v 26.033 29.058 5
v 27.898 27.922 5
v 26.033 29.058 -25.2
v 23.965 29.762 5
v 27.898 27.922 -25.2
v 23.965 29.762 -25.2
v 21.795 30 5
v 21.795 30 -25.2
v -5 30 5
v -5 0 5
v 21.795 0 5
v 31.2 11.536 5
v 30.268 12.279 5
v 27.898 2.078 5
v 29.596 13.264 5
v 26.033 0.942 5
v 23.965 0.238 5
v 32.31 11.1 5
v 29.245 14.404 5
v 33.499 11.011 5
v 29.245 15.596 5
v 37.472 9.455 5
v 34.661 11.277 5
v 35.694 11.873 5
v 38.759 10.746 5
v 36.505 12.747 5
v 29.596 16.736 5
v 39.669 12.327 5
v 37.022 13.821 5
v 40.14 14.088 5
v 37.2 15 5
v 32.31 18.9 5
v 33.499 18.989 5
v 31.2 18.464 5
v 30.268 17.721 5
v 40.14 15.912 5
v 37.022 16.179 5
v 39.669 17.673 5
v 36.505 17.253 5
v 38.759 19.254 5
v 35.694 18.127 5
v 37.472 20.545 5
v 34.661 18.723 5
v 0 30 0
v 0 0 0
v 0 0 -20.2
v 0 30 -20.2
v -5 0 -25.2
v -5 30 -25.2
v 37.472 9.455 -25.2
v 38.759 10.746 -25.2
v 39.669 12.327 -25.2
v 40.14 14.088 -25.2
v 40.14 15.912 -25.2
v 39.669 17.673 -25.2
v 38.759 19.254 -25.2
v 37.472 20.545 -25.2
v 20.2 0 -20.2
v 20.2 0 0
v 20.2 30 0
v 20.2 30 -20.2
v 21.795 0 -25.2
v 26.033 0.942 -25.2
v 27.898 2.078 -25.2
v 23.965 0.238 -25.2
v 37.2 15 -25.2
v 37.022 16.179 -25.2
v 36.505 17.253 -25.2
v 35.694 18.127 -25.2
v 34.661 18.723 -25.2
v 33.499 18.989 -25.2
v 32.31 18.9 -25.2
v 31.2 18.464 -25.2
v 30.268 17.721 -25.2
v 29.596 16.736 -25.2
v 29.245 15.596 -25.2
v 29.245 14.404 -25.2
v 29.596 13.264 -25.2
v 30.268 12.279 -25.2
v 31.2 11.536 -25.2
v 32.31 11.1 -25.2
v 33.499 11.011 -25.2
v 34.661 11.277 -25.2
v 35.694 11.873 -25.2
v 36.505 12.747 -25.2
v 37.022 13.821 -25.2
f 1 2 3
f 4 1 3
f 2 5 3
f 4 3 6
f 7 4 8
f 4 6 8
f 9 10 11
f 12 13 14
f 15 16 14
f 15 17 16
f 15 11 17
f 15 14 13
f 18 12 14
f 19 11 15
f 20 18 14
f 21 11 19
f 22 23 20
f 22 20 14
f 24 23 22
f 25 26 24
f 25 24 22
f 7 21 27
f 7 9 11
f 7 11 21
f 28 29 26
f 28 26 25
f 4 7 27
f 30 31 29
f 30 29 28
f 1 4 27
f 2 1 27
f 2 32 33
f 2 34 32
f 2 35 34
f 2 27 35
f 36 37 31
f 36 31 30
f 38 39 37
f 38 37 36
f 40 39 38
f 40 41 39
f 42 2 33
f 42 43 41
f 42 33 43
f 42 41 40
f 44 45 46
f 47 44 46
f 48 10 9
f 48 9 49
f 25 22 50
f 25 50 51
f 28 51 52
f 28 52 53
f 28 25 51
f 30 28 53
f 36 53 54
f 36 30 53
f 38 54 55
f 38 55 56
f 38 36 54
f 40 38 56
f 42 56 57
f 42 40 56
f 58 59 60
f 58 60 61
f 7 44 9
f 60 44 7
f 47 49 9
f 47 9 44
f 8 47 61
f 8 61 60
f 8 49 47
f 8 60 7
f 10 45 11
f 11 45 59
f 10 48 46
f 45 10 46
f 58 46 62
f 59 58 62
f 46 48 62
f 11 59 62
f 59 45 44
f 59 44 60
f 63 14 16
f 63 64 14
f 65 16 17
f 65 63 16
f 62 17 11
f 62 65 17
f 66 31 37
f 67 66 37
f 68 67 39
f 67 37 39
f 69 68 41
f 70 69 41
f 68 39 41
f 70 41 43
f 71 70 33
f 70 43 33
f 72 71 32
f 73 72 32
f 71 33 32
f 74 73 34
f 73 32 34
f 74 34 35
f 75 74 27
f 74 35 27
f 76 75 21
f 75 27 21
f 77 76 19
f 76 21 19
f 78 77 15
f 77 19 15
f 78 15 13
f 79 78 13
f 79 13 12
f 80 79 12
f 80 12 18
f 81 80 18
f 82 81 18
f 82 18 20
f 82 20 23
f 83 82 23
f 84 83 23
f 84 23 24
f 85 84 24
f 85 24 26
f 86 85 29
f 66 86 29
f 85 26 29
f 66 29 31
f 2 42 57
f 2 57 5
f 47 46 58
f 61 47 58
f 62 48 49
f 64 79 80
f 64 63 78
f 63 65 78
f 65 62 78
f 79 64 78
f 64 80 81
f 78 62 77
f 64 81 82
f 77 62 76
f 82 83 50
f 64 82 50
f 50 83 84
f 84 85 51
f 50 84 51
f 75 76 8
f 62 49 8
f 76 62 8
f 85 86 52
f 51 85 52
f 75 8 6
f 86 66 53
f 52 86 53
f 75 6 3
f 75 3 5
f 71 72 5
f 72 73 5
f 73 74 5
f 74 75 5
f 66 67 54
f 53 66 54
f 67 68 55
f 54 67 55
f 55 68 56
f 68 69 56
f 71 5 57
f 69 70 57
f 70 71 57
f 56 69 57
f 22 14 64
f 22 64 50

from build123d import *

# Parameters (mm, degrees)
SKETCH1_W           = 30.2
SKETCH1_H           = 30.2
SKETCH1_W_2         = 20.2
SKETCH1_H_2         = 20.2
EXTRUDE_THIN1_DEPTH = 30
SKETCH2_R           = 4
BOSS_EXTRUDE1_DEPTH = 30.2
FILLET1_R           = 10


with BuildPart() as part:
    # Sketch1 → Extrude-Thin1 (new body)
    with BuildSketch(Plane(origin=(0, 0, 0), x_dir=(1, 0, 0), z_dir=(0, 1, 0))):
        with Locations((10.1, 10.1)):
            Rectangle(SKETCH1_W, SKETCH1_H)
        with Locations((10.1, 10.1)):
            Rectangle(SKETCH1_W_2, SKETCH1_H_2, mode=Mode.SUBTRACT)
    extrude(amount=EXTRUDE_THIN1_DEPTH)

    # Sketch2 → Boss-Extrude1 (add)
    with BuildSketch(Plane.XY.offset(5)):
        with BuildLine():
            Line((37.472155728, 20.545149722), (25.2, 30))
            Line((25.2, 30), (25.2, 0))
            Line((25.2, 0), (37.472155728, 9.454850278))
            ThreePointArc((37.472155728, 9.454850278), (40.2, 15), (37.472155728, 20.545149722))
        make_face()
        with Locations((33.2, 15)):
            Circle(SKETCH2_R, mode=Mode.SUBTRACT)
    extrude(amount=-BOSS_EXTRUDE1_DEPTH)

    # Fillet1
    fillet1_edges = [part.edges().sort_by_distance(p)[0] for p in [
        (25.2, 30, -10.1),
        (25.2, 0, -10.1),
    ]]
    fillet(fillet1_edges, radius=FILLET1_R)


solid = part.part
